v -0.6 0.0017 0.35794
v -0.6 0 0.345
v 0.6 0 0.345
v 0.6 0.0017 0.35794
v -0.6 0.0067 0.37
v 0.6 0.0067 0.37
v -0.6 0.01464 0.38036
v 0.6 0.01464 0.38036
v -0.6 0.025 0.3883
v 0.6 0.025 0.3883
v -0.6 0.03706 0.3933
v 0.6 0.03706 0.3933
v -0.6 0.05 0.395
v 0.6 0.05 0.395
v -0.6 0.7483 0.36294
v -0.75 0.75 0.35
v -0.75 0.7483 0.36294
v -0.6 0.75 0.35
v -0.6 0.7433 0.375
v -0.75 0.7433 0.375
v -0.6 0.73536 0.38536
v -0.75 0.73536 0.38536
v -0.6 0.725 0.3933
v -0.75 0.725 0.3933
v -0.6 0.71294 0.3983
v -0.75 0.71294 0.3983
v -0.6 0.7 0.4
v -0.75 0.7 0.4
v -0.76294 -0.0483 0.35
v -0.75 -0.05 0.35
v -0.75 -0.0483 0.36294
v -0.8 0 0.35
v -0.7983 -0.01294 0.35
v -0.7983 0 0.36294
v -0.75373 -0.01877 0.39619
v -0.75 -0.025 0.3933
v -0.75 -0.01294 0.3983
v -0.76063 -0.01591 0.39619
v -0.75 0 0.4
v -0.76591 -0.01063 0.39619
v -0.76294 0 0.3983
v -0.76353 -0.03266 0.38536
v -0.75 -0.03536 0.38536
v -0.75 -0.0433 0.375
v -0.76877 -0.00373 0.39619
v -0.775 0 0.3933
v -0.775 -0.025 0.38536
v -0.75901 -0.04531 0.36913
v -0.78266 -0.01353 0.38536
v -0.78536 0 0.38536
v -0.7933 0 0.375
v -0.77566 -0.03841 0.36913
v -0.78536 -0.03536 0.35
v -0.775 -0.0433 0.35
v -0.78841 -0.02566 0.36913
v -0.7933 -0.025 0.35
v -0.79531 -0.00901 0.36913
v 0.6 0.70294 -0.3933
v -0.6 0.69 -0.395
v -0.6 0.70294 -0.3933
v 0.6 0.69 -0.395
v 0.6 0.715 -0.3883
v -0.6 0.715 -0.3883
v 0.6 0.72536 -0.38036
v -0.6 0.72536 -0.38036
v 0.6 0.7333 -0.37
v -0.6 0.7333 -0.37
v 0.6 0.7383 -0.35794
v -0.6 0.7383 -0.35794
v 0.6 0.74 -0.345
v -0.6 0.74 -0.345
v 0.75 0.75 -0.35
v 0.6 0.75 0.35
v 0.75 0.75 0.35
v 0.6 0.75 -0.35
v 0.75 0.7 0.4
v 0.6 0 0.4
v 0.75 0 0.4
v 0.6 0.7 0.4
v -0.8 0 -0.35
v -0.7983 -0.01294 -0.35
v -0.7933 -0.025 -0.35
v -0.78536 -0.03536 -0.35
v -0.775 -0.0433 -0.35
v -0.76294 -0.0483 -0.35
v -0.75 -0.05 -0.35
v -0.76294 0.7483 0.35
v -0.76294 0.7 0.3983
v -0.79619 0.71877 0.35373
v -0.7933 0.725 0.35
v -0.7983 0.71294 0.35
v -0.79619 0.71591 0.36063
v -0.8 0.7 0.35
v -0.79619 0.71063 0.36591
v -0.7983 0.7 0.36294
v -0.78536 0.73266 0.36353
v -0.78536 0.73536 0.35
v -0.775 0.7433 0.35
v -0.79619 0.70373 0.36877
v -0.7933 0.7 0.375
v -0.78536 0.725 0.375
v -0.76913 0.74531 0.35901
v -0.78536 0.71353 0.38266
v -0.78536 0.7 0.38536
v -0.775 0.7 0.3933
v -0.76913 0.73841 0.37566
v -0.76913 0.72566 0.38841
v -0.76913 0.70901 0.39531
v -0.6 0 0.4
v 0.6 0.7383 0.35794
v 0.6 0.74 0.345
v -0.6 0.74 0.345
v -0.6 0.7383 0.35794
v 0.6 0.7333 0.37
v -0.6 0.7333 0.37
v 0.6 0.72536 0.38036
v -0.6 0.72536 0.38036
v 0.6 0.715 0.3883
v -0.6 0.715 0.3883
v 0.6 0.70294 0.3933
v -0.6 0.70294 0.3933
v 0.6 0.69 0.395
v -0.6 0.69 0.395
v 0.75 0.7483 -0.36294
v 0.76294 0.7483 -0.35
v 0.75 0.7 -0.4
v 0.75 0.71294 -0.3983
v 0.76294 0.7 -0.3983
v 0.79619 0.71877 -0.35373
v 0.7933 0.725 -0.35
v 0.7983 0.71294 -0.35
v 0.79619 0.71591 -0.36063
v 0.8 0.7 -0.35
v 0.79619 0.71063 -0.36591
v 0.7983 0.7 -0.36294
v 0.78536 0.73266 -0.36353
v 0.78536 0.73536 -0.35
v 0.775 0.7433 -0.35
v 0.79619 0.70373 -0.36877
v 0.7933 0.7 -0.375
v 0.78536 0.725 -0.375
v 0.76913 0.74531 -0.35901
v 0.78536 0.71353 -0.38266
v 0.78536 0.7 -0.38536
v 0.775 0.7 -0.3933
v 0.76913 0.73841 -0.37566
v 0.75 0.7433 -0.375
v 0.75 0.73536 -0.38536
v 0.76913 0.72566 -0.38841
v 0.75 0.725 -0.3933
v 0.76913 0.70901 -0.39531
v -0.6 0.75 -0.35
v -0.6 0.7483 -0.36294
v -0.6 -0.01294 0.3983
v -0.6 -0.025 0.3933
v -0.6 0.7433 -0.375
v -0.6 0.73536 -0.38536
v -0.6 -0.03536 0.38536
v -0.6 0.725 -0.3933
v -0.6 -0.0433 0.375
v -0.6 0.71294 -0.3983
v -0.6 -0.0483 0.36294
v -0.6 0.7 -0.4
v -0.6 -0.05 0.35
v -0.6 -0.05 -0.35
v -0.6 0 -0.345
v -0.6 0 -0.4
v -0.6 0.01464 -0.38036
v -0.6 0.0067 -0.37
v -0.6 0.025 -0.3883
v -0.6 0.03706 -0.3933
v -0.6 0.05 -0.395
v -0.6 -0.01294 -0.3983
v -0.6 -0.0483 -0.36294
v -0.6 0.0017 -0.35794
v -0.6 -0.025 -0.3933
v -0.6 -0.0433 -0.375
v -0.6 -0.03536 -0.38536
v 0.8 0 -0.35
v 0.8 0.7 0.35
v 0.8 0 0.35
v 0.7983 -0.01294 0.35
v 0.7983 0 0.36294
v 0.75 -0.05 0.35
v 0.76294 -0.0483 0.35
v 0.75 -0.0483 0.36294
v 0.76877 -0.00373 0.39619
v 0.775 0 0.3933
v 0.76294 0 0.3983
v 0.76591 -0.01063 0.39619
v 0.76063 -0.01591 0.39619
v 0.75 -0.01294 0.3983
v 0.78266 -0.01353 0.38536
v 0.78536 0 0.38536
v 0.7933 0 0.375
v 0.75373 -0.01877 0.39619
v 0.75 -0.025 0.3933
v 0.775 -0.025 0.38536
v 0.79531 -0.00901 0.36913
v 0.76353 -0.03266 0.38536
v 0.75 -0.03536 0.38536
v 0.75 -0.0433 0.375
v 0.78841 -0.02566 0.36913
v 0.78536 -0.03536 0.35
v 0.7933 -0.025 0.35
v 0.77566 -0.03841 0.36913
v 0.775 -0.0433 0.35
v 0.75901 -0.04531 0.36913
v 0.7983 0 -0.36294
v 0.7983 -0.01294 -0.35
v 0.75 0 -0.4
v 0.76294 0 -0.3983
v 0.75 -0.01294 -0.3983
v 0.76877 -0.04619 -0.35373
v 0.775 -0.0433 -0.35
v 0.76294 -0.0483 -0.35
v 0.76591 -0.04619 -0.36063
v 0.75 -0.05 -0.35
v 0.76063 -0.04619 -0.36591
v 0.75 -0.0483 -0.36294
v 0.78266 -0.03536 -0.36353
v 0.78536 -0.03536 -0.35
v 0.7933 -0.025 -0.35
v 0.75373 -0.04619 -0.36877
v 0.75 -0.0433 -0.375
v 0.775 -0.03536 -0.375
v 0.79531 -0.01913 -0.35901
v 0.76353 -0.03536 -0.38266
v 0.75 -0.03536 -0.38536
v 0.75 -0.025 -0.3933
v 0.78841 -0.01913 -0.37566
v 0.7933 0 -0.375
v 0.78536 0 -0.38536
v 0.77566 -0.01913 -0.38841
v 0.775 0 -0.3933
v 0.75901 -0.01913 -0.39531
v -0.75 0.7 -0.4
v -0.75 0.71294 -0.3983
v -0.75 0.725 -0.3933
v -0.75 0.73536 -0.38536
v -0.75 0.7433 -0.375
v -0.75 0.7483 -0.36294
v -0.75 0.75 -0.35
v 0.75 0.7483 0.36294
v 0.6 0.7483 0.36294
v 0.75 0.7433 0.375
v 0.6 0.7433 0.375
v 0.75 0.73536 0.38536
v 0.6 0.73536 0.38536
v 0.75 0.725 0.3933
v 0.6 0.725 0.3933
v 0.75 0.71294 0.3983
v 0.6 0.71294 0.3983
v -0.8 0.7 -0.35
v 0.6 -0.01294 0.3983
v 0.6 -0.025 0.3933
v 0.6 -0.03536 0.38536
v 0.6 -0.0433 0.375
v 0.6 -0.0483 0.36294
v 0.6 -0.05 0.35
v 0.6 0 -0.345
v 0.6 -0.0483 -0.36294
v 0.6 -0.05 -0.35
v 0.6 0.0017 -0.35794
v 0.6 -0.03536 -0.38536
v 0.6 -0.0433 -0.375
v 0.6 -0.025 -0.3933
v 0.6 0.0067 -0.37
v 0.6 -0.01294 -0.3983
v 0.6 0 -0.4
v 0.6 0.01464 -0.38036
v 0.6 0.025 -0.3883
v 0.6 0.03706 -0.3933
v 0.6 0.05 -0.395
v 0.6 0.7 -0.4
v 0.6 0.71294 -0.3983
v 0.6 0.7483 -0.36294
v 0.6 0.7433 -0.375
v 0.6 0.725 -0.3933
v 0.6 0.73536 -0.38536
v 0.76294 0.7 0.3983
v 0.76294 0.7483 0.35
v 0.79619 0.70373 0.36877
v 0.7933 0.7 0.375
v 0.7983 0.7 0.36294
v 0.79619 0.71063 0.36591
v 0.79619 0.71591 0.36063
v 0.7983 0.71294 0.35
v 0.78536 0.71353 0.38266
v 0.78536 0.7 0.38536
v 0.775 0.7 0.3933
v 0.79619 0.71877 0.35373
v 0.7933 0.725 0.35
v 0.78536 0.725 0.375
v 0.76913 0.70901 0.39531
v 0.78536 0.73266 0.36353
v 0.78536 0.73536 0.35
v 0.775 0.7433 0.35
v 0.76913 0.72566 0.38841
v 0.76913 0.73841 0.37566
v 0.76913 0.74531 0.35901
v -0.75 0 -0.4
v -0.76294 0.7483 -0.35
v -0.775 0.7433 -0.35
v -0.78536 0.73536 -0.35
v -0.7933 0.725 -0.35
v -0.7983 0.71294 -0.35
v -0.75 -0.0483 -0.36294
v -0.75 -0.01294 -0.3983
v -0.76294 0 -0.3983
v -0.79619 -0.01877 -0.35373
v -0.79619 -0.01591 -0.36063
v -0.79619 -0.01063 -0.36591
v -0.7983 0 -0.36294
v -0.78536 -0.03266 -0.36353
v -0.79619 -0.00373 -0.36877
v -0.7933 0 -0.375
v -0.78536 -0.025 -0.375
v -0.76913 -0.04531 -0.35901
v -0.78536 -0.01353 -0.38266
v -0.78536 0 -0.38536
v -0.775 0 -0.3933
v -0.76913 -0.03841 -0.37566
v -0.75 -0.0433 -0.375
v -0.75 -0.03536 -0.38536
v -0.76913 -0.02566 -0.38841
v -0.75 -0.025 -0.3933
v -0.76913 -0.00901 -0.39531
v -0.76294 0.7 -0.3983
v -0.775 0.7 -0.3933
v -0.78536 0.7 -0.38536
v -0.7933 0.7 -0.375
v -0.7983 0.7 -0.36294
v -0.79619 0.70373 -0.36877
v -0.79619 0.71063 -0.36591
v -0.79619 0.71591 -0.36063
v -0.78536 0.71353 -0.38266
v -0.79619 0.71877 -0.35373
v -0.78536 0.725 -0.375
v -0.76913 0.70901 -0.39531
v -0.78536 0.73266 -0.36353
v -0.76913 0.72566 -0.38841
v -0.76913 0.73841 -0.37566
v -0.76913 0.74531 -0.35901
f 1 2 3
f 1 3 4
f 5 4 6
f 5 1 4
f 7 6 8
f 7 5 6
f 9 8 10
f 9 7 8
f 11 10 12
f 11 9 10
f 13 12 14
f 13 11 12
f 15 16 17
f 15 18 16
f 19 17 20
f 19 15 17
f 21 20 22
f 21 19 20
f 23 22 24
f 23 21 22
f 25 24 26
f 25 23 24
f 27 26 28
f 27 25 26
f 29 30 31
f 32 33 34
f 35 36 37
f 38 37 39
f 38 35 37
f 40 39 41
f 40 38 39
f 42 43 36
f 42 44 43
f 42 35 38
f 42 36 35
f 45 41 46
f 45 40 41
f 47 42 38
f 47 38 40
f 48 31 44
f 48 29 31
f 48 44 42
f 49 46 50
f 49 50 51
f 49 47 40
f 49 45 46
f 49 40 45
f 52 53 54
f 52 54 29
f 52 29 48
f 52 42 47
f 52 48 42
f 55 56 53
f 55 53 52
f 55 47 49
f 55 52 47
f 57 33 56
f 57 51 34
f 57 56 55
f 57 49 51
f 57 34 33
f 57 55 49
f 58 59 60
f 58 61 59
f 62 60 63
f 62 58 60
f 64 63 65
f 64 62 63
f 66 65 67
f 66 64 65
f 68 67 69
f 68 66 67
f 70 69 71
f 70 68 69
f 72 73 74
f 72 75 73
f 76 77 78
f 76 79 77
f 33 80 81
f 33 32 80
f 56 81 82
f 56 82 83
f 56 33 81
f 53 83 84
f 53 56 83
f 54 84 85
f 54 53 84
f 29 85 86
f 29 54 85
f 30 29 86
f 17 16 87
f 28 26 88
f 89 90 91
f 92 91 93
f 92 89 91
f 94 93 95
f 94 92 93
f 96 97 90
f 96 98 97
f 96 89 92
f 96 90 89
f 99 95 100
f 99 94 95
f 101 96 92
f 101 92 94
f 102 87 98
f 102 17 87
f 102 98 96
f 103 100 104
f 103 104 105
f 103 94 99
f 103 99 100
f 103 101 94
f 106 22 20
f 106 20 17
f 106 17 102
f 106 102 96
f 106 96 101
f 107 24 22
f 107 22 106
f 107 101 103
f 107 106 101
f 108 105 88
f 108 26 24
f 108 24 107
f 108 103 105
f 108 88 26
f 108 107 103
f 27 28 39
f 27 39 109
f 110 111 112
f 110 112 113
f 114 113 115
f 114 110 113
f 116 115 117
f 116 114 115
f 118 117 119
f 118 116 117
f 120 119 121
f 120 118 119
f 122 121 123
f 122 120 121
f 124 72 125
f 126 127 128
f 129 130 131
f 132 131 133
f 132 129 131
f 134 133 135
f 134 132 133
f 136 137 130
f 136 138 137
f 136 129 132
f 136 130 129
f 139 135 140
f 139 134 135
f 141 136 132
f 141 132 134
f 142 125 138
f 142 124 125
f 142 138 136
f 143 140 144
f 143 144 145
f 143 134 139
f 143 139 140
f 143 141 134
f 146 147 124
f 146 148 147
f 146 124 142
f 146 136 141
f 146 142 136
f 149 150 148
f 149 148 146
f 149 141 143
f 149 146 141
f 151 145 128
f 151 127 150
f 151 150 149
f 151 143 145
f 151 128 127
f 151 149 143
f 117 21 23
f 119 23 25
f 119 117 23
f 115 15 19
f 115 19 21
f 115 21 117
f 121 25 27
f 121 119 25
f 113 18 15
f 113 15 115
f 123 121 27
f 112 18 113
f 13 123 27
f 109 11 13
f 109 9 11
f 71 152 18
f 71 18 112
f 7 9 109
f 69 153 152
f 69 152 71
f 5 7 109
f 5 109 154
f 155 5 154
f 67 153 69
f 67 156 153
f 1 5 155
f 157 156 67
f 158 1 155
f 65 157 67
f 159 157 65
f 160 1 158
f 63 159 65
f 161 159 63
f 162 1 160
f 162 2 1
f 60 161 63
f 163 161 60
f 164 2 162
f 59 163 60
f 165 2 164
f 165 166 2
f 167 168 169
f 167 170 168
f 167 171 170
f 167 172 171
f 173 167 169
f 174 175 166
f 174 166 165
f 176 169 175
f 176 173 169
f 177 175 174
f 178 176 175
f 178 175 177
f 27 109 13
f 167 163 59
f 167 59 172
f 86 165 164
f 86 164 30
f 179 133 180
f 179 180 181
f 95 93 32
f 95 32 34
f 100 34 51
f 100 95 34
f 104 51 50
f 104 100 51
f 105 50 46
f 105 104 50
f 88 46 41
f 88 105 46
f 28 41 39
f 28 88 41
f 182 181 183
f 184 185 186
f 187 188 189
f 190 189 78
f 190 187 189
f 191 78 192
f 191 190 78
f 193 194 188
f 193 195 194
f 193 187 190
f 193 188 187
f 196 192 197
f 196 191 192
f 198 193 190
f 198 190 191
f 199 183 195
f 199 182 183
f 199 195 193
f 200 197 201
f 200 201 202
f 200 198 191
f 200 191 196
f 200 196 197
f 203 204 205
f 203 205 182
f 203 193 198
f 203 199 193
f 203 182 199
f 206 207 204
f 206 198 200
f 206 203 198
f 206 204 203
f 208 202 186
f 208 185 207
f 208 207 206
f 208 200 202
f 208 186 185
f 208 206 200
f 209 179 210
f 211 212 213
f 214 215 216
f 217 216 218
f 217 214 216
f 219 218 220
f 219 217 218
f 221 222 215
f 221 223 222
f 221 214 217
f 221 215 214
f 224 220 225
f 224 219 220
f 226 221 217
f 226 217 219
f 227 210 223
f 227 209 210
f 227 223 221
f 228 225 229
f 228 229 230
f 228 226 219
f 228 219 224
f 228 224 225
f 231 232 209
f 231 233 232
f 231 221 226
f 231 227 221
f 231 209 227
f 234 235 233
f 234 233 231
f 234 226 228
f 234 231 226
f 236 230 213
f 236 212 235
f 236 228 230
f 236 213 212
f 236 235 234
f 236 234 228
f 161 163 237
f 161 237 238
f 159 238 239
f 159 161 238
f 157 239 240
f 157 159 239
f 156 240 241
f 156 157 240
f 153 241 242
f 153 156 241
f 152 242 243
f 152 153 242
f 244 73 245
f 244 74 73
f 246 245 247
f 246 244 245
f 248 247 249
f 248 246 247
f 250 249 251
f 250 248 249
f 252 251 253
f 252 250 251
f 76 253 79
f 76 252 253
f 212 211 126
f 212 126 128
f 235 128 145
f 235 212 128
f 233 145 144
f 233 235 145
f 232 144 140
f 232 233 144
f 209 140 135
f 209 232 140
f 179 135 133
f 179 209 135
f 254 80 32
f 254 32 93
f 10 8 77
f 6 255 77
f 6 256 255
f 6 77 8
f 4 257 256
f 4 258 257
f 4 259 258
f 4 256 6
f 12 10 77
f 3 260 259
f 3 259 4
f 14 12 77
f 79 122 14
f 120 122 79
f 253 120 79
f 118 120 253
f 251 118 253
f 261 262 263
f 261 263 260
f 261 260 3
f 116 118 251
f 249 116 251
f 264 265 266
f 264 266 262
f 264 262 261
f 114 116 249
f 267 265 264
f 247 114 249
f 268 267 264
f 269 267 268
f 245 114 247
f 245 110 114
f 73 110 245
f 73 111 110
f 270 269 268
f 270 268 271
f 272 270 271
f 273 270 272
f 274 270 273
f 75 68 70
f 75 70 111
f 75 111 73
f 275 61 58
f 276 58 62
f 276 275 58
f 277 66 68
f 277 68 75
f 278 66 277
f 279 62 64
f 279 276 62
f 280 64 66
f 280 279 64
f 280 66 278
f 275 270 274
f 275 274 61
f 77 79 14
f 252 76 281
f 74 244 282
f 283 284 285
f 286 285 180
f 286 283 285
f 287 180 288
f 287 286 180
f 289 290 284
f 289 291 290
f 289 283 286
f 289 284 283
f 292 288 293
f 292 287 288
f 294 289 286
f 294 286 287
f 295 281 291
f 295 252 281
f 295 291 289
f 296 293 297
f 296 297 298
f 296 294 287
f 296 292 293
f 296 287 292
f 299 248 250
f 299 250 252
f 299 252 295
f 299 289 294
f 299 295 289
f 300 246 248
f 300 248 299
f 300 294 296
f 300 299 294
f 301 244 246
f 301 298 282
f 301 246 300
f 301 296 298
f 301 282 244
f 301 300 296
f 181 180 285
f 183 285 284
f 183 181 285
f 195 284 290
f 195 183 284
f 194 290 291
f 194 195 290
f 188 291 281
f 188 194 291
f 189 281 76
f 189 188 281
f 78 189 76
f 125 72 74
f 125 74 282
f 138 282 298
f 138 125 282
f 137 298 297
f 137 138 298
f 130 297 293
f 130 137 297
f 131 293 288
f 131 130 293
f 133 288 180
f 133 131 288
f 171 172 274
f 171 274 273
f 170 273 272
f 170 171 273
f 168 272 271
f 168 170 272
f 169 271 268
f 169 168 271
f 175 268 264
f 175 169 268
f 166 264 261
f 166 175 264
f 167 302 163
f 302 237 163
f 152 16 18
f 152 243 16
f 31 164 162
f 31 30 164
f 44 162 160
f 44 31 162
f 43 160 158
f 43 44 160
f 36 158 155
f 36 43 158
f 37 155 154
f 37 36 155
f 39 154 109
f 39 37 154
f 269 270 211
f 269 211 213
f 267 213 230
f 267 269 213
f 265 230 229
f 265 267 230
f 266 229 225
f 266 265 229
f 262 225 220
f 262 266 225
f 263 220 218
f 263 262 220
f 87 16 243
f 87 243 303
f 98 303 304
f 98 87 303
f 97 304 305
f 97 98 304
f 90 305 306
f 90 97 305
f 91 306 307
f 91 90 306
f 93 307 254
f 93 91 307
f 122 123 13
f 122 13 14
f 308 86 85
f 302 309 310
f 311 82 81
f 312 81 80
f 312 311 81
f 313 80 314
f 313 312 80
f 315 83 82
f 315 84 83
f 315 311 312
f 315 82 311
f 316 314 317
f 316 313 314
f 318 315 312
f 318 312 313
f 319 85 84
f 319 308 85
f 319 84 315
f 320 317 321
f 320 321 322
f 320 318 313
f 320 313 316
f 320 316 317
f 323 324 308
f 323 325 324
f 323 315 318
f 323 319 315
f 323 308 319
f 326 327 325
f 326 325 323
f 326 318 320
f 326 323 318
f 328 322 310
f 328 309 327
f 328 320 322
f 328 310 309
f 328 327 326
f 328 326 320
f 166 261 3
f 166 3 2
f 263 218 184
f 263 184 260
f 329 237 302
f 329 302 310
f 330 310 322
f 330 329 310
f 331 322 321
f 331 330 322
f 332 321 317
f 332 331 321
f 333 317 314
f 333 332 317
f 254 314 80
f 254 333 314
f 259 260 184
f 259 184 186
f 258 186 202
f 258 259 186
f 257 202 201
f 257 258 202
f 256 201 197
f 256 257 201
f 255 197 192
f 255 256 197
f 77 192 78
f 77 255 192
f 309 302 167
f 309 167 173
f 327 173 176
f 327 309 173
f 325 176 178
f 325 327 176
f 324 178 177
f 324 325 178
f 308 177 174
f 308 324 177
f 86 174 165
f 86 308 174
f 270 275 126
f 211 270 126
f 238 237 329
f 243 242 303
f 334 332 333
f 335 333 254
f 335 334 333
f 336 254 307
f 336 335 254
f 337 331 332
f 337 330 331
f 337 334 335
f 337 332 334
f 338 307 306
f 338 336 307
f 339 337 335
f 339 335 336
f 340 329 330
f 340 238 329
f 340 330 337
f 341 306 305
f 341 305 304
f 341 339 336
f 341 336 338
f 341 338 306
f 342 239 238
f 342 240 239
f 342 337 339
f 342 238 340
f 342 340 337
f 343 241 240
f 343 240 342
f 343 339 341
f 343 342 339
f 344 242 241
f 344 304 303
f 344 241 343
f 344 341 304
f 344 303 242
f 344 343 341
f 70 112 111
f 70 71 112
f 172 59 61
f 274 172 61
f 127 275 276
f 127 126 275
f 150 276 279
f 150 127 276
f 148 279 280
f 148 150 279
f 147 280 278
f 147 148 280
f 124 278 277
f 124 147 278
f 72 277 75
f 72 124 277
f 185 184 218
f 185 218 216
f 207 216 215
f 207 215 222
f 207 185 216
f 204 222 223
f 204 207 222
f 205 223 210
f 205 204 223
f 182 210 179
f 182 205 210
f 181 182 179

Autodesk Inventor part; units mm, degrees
ref_plane "YZ Plane" through (0, 0, 0) normal (1, 0, 0) x (0, 1, 0)
ref_plane "XZ Plane" through (0, 0, 0) normal (0, 1, 0) x (-1, 0, 0)
ref_plane "XY Plane" through (0, 0, 0) normal (0, 0, 1) x (1, 0, 0)
sketch "Sketch1" plane through (0, 0, 0) normal (0, 0, 1) x (1, 0, 0)
  line L0 (-0.8, 0.75) -> (-0.6, 0.75)
  line L1 (-0.6, 0.75) -> (-0.6, -0.05)
  line L2 (-0.6, -0.05) -> (-0.8, -0.05)
  line L3 (-0.8, -0.05) -> (-0.8, 0.75)
  line L4 (-0.6, 0.74) -> (0.6, 0.74)
  line L5 (0.6, 0.74) -> (0.6, 0)
  line L6 (0.6, 0) -> (-0.6, 0)
  line L7 (-0.6, 0) -> (-0.6, 0.74)
  line L8 (0.6, 0.75) -> (0.8, 0.75)
  line L9 (0.8, 0.75) -> (0.8, -0.05)
  line L10 (0.8, -0.05) -> (0.6, -0.05)
  line L11 (0.6, -0.05) -> (0.6, 0.75)
  point P0 (0, 0)
  point P1 (0, 0.74)
  point P2 (0, 0)
  dimension "d0" = 1.6
  dimension "d1" = 0.8
  dimension "d2" = 0.2
  dimension "d3" = 0.05
  dimension "d6" = 0.01
extrude "Extrusion1" add sketch "Sketch1" along normal mid plane 0.8 contours L0 L1 L2 L3 | L11 L8 L9 L10 L5
extrude "Extrusion2" add sketch "Sketch1" along normal mid plane 0.79 contours L4 L5 L6 L1
fillet "Fillet2" radius 0.05 4 edges at (0, 0.74, 0.395) (0, 0, 0.395) (0, 0.74, -0.395) (0, 0, -0.395)
fillet "Fillet1" radius 0.05 16 edges at (-0.7, 0.75, 0.4) (0.7, 0.75, 0.4) (-0.7, 0.75, -0.4) (0.7, 0.75, -0.4) (0.8, 0.75, 0) (0.8, 0.35, -0.4) (0.8, -0.05, 0) (0.7, -0.05, -0.4) (0.7, -0.05, 0.4) (0.8, 0.35, 0.4) (-0.7, -0.05, -0.4) (-0.8, -0.05, 0) (-0.8, 0.35, 0.4) (-0.7, -0.05, 0.4) (-0.8, 0.35, -0.4) (-0.8, 0.75, 0)
properties part number "Resistor_1608-0.5mm" material "Copper"
